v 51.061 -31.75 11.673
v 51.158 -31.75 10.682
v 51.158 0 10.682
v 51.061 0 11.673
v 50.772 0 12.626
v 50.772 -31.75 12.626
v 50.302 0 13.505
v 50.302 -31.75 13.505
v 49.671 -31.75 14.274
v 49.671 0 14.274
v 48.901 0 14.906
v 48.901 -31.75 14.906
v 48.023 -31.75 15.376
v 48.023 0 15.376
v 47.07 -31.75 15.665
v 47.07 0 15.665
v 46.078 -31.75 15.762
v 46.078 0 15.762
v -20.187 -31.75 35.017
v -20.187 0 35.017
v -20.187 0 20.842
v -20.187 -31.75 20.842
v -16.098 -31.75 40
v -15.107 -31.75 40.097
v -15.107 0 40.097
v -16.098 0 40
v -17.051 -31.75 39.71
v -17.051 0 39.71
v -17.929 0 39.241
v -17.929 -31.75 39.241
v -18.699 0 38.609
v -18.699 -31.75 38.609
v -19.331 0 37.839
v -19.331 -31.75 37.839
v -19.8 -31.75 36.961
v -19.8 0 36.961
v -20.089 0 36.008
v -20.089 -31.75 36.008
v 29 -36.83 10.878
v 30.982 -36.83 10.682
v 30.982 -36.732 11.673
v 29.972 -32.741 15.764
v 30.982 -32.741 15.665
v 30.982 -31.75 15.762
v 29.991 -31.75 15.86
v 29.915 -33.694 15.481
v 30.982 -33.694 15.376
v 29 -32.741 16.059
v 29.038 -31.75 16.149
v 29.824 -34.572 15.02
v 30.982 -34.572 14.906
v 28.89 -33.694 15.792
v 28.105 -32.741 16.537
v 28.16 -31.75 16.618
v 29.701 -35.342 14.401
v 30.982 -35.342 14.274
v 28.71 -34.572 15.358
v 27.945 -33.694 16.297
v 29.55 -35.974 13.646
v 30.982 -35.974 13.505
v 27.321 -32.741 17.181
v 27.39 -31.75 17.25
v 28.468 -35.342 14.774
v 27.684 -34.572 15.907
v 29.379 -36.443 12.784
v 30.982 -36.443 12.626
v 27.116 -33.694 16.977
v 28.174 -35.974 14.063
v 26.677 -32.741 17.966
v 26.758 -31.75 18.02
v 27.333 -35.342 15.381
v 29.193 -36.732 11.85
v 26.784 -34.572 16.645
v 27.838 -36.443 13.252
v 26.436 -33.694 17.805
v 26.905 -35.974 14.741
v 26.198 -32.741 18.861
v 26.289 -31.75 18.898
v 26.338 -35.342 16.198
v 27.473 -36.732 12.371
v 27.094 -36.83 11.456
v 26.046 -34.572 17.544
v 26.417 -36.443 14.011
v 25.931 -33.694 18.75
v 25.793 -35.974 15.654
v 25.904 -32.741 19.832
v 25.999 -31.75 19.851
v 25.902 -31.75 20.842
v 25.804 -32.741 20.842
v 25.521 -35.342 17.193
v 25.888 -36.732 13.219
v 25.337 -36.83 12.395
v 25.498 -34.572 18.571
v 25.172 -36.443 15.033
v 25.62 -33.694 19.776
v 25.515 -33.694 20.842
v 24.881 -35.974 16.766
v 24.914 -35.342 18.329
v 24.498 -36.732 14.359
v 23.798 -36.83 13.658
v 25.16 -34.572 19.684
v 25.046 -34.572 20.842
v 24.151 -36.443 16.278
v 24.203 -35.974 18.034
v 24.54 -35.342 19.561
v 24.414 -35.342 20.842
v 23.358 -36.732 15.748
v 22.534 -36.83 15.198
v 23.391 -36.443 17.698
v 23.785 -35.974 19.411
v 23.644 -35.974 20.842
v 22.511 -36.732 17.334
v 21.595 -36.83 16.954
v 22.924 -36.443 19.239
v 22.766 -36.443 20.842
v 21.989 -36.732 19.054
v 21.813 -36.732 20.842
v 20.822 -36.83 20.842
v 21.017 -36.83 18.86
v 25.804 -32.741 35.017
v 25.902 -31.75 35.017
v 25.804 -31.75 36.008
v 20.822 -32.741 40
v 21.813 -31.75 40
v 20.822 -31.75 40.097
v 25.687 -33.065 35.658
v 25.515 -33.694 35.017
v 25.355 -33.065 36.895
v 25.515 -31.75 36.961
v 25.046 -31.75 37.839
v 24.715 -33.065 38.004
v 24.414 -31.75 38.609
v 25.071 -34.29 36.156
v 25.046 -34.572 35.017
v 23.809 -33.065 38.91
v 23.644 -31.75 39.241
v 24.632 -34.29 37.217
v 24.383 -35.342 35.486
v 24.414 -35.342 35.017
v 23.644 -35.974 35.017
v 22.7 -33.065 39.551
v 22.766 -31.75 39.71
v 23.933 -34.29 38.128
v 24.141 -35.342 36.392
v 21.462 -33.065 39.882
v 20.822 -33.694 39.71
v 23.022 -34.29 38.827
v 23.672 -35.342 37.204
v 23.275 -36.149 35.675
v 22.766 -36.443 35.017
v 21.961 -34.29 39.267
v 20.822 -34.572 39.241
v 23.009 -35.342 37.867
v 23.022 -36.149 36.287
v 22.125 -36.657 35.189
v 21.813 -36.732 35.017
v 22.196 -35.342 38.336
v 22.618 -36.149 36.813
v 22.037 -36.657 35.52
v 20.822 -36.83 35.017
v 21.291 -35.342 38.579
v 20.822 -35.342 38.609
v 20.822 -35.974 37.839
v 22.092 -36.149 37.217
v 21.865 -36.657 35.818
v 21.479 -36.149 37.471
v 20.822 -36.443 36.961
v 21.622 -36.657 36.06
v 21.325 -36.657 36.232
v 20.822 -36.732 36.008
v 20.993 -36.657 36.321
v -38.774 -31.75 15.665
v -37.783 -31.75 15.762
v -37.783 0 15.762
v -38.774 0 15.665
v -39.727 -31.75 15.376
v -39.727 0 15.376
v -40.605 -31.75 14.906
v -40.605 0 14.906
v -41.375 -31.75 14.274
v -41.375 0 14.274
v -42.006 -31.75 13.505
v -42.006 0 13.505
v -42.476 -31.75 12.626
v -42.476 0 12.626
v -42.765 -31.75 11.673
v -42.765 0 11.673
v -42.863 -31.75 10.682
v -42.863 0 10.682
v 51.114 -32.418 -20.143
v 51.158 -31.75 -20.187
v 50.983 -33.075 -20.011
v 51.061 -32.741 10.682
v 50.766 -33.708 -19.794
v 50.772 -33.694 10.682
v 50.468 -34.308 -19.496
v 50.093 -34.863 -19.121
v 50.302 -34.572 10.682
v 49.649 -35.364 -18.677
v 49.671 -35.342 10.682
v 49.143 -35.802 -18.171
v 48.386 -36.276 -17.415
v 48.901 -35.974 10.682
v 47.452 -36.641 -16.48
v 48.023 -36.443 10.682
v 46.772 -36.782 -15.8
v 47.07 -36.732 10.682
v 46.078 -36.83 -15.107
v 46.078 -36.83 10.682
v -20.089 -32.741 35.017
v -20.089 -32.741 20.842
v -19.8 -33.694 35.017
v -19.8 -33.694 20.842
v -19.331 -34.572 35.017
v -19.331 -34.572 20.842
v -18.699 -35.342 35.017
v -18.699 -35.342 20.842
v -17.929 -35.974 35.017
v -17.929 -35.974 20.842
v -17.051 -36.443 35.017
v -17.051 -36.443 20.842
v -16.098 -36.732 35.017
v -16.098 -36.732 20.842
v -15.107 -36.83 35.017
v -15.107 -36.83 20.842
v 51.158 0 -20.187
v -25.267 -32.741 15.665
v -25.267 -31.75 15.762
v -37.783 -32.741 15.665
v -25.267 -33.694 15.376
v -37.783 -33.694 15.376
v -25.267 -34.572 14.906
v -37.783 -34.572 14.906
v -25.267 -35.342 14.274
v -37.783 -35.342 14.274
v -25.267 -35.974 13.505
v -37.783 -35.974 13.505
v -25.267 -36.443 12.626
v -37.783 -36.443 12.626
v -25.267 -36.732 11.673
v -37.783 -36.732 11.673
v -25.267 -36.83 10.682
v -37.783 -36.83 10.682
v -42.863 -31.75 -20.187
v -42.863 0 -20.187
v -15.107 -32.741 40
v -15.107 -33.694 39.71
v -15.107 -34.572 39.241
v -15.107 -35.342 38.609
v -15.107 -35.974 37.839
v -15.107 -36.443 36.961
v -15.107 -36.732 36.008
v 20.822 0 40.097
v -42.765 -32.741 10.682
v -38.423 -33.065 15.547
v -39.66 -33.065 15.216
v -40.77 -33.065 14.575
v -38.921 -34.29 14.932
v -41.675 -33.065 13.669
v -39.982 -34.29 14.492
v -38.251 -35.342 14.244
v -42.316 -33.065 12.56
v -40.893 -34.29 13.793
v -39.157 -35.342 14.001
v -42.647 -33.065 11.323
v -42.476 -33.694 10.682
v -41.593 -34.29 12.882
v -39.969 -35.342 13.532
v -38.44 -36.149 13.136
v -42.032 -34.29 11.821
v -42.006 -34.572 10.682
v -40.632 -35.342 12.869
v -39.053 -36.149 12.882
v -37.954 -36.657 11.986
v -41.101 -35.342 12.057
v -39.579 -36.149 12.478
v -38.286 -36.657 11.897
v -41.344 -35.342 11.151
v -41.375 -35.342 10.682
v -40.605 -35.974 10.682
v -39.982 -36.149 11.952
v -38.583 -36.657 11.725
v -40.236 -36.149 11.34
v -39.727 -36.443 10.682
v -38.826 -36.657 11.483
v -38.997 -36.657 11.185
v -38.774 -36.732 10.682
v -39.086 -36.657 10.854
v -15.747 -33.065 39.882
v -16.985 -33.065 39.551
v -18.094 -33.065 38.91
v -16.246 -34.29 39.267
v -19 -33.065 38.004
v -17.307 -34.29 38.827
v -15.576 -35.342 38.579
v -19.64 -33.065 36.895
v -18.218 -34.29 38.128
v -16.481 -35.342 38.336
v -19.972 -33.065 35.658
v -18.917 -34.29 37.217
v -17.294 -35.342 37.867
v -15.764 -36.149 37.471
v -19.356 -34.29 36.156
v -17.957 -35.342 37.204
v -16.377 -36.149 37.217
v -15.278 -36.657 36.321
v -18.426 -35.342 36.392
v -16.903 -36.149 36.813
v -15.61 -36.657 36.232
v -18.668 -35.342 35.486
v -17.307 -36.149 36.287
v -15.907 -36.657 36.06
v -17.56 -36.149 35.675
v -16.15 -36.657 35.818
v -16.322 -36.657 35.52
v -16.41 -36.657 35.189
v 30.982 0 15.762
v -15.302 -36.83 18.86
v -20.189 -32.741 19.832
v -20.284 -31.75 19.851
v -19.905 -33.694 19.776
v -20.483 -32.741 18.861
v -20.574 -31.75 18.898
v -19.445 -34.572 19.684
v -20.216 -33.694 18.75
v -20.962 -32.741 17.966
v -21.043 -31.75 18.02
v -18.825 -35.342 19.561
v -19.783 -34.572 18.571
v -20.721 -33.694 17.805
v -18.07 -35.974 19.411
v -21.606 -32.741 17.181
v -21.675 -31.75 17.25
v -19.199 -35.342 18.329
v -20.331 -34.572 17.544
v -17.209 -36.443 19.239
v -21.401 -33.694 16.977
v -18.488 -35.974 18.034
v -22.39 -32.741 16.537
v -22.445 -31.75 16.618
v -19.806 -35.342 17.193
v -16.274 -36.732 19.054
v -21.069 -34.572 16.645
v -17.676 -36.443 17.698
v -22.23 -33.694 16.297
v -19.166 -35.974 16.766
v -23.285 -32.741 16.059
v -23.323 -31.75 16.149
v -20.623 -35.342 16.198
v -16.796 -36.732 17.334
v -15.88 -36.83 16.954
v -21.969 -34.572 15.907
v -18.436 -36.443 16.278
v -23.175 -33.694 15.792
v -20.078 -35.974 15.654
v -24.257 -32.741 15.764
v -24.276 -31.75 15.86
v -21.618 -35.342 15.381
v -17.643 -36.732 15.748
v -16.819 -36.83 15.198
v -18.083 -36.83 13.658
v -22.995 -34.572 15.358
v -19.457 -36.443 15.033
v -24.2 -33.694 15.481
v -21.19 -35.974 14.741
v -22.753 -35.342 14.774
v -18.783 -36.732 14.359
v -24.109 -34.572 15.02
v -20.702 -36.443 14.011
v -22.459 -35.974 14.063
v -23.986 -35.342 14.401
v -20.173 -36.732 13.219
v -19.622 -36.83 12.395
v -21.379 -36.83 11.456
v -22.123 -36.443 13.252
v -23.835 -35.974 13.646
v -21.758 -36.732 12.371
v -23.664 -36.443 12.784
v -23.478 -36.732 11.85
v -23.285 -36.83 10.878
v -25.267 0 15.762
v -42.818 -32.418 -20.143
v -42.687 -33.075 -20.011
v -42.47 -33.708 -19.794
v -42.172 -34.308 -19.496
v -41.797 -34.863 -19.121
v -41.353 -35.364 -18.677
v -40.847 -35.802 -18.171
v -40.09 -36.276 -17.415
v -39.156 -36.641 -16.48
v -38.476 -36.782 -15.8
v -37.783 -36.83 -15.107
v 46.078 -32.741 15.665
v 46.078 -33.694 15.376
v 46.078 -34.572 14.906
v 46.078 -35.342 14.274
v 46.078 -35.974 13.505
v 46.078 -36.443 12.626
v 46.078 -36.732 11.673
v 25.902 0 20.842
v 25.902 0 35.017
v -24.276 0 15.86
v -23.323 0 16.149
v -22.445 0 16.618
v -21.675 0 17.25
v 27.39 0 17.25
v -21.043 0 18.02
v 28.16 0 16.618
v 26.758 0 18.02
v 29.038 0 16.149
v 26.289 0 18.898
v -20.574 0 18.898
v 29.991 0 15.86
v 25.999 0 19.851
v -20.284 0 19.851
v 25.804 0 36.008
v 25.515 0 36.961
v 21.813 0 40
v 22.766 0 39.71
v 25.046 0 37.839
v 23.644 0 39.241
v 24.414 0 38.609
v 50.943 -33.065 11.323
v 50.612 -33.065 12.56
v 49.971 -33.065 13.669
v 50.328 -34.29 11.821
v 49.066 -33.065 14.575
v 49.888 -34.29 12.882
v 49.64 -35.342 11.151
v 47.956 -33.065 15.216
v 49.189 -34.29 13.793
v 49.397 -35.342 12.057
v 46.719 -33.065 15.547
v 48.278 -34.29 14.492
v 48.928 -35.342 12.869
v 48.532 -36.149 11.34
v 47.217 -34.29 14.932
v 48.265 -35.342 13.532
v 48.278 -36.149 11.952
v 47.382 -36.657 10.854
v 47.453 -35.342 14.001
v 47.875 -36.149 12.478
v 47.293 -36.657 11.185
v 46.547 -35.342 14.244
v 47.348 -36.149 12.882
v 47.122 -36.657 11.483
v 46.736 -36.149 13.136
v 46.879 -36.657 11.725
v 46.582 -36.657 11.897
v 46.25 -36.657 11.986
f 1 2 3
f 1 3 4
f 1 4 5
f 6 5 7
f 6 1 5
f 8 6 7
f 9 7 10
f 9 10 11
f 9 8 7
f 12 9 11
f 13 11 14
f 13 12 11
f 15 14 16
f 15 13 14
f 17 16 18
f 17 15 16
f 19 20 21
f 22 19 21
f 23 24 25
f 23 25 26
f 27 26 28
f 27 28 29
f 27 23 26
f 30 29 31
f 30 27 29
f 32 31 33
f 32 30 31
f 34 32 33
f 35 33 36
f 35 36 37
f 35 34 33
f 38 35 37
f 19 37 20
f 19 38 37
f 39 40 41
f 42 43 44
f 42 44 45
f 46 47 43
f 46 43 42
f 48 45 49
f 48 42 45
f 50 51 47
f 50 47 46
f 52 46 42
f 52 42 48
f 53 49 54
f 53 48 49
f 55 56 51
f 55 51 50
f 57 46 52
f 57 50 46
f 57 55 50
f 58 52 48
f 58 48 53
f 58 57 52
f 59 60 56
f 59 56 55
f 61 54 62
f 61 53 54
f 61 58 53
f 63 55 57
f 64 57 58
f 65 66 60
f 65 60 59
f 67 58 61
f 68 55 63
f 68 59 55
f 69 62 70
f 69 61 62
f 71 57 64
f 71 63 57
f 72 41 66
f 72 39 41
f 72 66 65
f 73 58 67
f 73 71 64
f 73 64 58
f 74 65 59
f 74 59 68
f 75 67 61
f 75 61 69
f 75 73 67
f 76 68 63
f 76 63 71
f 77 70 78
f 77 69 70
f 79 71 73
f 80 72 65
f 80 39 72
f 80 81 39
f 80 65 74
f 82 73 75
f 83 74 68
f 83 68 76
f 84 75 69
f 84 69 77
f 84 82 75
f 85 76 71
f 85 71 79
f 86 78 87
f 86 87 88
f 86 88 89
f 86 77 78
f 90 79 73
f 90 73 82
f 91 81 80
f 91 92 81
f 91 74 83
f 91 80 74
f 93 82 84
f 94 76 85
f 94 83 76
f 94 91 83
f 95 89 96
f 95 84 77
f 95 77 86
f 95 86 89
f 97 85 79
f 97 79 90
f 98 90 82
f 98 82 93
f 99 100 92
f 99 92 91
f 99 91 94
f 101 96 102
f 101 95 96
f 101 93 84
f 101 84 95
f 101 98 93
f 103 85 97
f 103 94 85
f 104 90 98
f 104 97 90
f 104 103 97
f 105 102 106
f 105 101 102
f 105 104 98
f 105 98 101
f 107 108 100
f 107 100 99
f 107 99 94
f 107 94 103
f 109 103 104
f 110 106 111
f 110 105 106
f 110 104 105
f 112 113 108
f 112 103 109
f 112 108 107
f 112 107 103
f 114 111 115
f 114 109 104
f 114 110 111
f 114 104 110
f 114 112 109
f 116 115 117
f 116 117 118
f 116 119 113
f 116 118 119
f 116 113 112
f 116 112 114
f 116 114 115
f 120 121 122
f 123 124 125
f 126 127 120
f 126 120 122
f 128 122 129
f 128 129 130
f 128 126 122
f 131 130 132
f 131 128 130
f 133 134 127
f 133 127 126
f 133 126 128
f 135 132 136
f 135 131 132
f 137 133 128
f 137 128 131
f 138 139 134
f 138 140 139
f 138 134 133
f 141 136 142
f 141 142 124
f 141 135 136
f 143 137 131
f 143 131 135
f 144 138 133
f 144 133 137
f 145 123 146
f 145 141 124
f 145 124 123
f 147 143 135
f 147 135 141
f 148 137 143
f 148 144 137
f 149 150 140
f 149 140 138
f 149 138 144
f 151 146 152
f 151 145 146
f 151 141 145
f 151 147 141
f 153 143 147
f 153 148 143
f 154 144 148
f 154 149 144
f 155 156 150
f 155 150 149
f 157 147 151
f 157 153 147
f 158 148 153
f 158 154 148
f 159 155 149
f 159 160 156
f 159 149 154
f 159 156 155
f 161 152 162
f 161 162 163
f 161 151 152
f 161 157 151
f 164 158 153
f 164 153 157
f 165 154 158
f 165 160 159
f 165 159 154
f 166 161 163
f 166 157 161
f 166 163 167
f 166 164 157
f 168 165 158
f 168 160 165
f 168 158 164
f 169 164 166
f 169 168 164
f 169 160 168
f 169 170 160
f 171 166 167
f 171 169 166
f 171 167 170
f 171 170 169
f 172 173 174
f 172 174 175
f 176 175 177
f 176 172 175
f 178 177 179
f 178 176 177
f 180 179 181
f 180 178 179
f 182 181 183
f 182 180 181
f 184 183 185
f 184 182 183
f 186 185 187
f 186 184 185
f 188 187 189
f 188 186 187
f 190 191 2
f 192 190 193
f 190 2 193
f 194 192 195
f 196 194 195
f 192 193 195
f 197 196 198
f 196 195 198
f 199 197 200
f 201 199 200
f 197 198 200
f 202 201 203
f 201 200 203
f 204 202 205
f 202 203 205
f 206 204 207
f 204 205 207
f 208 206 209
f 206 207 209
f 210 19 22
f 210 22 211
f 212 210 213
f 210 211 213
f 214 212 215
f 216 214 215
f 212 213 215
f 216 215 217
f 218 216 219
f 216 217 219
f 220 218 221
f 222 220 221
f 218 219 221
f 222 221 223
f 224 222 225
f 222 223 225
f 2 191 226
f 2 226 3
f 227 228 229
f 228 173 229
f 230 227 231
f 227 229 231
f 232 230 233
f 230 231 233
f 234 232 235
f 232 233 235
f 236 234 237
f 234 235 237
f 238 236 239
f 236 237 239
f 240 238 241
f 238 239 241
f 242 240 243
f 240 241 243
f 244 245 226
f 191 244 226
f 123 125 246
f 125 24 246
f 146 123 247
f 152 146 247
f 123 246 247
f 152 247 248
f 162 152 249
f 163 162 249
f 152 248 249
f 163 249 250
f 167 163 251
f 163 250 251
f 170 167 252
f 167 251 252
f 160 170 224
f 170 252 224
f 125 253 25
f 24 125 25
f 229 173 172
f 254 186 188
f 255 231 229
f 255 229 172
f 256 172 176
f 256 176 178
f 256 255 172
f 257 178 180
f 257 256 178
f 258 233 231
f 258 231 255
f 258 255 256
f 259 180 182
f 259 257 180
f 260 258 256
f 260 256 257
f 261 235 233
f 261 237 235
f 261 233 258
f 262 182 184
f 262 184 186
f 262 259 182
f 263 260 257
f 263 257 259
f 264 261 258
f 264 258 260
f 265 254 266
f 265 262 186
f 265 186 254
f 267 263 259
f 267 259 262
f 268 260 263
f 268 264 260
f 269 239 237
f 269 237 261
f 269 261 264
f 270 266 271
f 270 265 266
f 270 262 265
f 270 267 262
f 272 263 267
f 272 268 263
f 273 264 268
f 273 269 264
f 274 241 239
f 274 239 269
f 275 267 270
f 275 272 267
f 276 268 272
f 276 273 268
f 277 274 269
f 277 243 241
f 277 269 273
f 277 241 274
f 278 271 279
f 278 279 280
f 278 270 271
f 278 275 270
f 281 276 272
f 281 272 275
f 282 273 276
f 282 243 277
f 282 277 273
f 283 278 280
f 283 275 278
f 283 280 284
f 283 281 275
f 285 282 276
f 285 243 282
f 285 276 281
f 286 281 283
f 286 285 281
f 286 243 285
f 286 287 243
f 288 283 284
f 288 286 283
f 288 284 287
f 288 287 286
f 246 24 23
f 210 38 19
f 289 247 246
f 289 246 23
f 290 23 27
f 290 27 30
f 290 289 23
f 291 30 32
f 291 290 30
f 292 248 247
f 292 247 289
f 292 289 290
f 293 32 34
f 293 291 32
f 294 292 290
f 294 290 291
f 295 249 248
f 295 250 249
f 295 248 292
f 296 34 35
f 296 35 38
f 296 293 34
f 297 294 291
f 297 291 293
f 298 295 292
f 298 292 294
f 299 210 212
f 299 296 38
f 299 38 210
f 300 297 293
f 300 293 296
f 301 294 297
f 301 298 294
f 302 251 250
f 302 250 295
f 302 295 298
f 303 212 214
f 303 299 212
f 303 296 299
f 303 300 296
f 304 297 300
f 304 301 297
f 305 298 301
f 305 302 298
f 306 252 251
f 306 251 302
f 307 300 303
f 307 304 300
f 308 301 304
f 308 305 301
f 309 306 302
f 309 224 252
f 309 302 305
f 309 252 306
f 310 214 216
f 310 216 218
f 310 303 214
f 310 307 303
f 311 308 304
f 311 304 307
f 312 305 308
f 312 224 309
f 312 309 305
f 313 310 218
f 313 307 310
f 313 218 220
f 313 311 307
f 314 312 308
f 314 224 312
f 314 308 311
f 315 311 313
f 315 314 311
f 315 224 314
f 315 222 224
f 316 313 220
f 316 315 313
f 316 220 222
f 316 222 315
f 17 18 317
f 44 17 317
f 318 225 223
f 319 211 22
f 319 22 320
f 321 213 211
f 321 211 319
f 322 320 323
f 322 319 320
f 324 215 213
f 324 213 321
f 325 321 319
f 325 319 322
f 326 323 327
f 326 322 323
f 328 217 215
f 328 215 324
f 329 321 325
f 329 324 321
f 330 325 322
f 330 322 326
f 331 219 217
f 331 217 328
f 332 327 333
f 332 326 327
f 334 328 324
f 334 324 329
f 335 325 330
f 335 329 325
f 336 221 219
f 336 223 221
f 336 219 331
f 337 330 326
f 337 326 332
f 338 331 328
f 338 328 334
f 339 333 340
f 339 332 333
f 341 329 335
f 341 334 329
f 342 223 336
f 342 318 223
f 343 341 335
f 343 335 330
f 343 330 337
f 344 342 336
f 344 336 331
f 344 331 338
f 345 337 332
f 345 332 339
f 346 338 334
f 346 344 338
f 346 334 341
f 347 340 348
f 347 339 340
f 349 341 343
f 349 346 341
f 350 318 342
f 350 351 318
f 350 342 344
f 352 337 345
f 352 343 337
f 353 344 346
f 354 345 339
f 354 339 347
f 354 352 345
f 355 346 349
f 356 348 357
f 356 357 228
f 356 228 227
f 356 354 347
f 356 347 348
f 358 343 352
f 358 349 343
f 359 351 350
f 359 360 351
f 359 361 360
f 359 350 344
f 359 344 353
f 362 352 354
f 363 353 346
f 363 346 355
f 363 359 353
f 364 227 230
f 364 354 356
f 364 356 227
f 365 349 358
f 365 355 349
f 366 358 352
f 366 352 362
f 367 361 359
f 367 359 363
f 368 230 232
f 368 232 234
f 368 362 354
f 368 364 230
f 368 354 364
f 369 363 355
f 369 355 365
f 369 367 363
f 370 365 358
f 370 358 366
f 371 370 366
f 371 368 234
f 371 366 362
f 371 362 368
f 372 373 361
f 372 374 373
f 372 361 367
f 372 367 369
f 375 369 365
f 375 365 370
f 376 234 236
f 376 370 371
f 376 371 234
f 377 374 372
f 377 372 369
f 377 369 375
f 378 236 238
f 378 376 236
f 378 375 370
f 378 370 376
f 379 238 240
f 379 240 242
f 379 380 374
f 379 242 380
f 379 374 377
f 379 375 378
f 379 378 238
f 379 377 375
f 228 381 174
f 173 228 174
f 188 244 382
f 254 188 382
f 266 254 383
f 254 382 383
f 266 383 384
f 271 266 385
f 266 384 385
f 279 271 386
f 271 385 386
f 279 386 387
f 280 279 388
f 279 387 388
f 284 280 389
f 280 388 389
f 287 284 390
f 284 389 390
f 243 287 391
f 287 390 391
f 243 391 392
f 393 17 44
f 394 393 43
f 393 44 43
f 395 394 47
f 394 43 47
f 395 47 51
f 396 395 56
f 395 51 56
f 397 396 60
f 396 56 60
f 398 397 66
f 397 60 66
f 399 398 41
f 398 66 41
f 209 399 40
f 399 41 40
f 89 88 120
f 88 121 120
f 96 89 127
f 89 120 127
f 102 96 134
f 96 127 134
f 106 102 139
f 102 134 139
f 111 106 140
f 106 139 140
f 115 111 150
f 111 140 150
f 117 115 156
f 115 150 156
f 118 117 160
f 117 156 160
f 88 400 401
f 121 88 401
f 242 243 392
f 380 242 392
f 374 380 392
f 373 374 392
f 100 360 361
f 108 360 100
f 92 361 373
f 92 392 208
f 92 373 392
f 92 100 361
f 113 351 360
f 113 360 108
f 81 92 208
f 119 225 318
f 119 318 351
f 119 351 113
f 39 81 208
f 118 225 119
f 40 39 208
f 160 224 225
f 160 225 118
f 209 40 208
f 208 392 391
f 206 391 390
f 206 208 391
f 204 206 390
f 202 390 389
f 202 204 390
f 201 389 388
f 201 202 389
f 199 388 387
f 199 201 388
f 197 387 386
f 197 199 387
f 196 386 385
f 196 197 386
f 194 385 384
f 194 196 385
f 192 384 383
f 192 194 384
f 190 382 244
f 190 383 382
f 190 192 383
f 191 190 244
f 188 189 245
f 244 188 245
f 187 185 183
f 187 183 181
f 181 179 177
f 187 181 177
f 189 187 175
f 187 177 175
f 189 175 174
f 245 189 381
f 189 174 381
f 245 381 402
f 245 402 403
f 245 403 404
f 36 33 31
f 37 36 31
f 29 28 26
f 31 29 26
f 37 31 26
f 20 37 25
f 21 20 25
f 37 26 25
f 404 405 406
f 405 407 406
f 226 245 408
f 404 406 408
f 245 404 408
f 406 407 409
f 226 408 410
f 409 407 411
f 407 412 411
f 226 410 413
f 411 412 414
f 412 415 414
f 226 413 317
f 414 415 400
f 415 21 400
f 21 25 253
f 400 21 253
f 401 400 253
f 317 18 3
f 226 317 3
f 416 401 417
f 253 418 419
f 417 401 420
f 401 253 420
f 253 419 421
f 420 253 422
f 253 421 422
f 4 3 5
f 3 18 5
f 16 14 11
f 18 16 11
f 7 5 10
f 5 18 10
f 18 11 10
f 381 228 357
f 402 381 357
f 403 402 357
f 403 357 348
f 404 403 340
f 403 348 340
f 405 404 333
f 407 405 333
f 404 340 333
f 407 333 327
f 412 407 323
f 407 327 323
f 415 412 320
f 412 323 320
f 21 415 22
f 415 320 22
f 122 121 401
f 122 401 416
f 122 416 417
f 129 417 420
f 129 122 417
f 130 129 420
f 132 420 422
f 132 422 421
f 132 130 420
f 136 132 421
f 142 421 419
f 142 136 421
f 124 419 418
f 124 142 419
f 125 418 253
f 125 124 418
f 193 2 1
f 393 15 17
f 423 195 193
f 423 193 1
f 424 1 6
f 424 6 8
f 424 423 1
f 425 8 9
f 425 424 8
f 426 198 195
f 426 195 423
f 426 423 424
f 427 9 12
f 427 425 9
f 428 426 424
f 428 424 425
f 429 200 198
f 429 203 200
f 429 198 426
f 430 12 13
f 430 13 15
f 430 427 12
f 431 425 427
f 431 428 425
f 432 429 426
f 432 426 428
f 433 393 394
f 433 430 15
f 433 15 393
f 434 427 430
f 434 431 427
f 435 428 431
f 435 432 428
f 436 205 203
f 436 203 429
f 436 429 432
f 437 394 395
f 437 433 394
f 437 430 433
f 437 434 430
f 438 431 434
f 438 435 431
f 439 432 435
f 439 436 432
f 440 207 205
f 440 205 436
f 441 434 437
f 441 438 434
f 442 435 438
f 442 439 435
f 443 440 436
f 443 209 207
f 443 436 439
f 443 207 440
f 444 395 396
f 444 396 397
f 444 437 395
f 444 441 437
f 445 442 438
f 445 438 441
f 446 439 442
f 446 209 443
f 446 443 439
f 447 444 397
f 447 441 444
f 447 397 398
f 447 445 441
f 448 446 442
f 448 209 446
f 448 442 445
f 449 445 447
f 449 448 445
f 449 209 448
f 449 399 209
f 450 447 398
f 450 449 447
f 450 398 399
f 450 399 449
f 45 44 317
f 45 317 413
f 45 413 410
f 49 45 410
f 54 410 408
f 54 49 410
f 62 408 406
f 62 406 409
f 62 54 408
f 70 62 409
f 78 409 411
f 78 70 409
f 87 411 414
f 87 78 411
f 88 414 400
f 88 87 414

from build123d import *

# Parameters (mm, degrees)
F1_DEPTH = 36.83
F2_R     = 5.08
F3_R     = 5.08


with BuildPart() as f1:
    # F0 (on Front) → F1 (new body)
    with BuildSketch(Plane.XZ):
        Polygon((-20.186856, 15.762338), (-42.862501, 15.762338), (-42.862501, -20.186855), (51.158469, -20.186855), (51.158469, 15.762338), (25.901856, 15.762338), (25.901856, 40.097181), (-20.186856, 40.097181), align=None)
    extrude(amount=F1_DEPTH)

    # F2
    f2_edges = [f1.edges().sort_by_distance(p)[0] for p in [
        (25.901856, -18.415, 40.097181),
        (-20.186856, -18.415, 40.097181),
        (51.158469, -18.415, 15.762338),
        (25.901856, -18.415, 15.762338),
        (-20.186856, -18.415, 15.762338),
        (-42.862501, -18.415, 15.762338),
    ]]
    fillet(f2_edges, radius=F2_R)

    # F3
    f3_edges = [f1.edges().sort_by_distance(p)[0] for p in [
        (-31.524679, -36.83, 15.762338),
        (-21.674754, -36.83, 17.250236),
        (-41.374603, -36.83, 14.274441),
        (-20.186856, -36.83, 27.92976),
        (-42.862501, -36.83, -4.752258),
        (-18.698959, -36.83, 38.609283),
        (4.147984, -36.83, -20.186855),
        (2.8575, -36.83, 40.097181),
        (51.158469, -36.83, -4.752258),
        (24.413958, -36.83, 38.609283),
        (49.670572, -36.83, 14.274441),
        (25.901856, -36.83, 27.92976),
        (38.530163, -36.83, 15.762338),
        (27.389753, -36.83, 17.250236),
    ]]
    fillet(f3_edges, radius=F3_R)


solid = f1.part
